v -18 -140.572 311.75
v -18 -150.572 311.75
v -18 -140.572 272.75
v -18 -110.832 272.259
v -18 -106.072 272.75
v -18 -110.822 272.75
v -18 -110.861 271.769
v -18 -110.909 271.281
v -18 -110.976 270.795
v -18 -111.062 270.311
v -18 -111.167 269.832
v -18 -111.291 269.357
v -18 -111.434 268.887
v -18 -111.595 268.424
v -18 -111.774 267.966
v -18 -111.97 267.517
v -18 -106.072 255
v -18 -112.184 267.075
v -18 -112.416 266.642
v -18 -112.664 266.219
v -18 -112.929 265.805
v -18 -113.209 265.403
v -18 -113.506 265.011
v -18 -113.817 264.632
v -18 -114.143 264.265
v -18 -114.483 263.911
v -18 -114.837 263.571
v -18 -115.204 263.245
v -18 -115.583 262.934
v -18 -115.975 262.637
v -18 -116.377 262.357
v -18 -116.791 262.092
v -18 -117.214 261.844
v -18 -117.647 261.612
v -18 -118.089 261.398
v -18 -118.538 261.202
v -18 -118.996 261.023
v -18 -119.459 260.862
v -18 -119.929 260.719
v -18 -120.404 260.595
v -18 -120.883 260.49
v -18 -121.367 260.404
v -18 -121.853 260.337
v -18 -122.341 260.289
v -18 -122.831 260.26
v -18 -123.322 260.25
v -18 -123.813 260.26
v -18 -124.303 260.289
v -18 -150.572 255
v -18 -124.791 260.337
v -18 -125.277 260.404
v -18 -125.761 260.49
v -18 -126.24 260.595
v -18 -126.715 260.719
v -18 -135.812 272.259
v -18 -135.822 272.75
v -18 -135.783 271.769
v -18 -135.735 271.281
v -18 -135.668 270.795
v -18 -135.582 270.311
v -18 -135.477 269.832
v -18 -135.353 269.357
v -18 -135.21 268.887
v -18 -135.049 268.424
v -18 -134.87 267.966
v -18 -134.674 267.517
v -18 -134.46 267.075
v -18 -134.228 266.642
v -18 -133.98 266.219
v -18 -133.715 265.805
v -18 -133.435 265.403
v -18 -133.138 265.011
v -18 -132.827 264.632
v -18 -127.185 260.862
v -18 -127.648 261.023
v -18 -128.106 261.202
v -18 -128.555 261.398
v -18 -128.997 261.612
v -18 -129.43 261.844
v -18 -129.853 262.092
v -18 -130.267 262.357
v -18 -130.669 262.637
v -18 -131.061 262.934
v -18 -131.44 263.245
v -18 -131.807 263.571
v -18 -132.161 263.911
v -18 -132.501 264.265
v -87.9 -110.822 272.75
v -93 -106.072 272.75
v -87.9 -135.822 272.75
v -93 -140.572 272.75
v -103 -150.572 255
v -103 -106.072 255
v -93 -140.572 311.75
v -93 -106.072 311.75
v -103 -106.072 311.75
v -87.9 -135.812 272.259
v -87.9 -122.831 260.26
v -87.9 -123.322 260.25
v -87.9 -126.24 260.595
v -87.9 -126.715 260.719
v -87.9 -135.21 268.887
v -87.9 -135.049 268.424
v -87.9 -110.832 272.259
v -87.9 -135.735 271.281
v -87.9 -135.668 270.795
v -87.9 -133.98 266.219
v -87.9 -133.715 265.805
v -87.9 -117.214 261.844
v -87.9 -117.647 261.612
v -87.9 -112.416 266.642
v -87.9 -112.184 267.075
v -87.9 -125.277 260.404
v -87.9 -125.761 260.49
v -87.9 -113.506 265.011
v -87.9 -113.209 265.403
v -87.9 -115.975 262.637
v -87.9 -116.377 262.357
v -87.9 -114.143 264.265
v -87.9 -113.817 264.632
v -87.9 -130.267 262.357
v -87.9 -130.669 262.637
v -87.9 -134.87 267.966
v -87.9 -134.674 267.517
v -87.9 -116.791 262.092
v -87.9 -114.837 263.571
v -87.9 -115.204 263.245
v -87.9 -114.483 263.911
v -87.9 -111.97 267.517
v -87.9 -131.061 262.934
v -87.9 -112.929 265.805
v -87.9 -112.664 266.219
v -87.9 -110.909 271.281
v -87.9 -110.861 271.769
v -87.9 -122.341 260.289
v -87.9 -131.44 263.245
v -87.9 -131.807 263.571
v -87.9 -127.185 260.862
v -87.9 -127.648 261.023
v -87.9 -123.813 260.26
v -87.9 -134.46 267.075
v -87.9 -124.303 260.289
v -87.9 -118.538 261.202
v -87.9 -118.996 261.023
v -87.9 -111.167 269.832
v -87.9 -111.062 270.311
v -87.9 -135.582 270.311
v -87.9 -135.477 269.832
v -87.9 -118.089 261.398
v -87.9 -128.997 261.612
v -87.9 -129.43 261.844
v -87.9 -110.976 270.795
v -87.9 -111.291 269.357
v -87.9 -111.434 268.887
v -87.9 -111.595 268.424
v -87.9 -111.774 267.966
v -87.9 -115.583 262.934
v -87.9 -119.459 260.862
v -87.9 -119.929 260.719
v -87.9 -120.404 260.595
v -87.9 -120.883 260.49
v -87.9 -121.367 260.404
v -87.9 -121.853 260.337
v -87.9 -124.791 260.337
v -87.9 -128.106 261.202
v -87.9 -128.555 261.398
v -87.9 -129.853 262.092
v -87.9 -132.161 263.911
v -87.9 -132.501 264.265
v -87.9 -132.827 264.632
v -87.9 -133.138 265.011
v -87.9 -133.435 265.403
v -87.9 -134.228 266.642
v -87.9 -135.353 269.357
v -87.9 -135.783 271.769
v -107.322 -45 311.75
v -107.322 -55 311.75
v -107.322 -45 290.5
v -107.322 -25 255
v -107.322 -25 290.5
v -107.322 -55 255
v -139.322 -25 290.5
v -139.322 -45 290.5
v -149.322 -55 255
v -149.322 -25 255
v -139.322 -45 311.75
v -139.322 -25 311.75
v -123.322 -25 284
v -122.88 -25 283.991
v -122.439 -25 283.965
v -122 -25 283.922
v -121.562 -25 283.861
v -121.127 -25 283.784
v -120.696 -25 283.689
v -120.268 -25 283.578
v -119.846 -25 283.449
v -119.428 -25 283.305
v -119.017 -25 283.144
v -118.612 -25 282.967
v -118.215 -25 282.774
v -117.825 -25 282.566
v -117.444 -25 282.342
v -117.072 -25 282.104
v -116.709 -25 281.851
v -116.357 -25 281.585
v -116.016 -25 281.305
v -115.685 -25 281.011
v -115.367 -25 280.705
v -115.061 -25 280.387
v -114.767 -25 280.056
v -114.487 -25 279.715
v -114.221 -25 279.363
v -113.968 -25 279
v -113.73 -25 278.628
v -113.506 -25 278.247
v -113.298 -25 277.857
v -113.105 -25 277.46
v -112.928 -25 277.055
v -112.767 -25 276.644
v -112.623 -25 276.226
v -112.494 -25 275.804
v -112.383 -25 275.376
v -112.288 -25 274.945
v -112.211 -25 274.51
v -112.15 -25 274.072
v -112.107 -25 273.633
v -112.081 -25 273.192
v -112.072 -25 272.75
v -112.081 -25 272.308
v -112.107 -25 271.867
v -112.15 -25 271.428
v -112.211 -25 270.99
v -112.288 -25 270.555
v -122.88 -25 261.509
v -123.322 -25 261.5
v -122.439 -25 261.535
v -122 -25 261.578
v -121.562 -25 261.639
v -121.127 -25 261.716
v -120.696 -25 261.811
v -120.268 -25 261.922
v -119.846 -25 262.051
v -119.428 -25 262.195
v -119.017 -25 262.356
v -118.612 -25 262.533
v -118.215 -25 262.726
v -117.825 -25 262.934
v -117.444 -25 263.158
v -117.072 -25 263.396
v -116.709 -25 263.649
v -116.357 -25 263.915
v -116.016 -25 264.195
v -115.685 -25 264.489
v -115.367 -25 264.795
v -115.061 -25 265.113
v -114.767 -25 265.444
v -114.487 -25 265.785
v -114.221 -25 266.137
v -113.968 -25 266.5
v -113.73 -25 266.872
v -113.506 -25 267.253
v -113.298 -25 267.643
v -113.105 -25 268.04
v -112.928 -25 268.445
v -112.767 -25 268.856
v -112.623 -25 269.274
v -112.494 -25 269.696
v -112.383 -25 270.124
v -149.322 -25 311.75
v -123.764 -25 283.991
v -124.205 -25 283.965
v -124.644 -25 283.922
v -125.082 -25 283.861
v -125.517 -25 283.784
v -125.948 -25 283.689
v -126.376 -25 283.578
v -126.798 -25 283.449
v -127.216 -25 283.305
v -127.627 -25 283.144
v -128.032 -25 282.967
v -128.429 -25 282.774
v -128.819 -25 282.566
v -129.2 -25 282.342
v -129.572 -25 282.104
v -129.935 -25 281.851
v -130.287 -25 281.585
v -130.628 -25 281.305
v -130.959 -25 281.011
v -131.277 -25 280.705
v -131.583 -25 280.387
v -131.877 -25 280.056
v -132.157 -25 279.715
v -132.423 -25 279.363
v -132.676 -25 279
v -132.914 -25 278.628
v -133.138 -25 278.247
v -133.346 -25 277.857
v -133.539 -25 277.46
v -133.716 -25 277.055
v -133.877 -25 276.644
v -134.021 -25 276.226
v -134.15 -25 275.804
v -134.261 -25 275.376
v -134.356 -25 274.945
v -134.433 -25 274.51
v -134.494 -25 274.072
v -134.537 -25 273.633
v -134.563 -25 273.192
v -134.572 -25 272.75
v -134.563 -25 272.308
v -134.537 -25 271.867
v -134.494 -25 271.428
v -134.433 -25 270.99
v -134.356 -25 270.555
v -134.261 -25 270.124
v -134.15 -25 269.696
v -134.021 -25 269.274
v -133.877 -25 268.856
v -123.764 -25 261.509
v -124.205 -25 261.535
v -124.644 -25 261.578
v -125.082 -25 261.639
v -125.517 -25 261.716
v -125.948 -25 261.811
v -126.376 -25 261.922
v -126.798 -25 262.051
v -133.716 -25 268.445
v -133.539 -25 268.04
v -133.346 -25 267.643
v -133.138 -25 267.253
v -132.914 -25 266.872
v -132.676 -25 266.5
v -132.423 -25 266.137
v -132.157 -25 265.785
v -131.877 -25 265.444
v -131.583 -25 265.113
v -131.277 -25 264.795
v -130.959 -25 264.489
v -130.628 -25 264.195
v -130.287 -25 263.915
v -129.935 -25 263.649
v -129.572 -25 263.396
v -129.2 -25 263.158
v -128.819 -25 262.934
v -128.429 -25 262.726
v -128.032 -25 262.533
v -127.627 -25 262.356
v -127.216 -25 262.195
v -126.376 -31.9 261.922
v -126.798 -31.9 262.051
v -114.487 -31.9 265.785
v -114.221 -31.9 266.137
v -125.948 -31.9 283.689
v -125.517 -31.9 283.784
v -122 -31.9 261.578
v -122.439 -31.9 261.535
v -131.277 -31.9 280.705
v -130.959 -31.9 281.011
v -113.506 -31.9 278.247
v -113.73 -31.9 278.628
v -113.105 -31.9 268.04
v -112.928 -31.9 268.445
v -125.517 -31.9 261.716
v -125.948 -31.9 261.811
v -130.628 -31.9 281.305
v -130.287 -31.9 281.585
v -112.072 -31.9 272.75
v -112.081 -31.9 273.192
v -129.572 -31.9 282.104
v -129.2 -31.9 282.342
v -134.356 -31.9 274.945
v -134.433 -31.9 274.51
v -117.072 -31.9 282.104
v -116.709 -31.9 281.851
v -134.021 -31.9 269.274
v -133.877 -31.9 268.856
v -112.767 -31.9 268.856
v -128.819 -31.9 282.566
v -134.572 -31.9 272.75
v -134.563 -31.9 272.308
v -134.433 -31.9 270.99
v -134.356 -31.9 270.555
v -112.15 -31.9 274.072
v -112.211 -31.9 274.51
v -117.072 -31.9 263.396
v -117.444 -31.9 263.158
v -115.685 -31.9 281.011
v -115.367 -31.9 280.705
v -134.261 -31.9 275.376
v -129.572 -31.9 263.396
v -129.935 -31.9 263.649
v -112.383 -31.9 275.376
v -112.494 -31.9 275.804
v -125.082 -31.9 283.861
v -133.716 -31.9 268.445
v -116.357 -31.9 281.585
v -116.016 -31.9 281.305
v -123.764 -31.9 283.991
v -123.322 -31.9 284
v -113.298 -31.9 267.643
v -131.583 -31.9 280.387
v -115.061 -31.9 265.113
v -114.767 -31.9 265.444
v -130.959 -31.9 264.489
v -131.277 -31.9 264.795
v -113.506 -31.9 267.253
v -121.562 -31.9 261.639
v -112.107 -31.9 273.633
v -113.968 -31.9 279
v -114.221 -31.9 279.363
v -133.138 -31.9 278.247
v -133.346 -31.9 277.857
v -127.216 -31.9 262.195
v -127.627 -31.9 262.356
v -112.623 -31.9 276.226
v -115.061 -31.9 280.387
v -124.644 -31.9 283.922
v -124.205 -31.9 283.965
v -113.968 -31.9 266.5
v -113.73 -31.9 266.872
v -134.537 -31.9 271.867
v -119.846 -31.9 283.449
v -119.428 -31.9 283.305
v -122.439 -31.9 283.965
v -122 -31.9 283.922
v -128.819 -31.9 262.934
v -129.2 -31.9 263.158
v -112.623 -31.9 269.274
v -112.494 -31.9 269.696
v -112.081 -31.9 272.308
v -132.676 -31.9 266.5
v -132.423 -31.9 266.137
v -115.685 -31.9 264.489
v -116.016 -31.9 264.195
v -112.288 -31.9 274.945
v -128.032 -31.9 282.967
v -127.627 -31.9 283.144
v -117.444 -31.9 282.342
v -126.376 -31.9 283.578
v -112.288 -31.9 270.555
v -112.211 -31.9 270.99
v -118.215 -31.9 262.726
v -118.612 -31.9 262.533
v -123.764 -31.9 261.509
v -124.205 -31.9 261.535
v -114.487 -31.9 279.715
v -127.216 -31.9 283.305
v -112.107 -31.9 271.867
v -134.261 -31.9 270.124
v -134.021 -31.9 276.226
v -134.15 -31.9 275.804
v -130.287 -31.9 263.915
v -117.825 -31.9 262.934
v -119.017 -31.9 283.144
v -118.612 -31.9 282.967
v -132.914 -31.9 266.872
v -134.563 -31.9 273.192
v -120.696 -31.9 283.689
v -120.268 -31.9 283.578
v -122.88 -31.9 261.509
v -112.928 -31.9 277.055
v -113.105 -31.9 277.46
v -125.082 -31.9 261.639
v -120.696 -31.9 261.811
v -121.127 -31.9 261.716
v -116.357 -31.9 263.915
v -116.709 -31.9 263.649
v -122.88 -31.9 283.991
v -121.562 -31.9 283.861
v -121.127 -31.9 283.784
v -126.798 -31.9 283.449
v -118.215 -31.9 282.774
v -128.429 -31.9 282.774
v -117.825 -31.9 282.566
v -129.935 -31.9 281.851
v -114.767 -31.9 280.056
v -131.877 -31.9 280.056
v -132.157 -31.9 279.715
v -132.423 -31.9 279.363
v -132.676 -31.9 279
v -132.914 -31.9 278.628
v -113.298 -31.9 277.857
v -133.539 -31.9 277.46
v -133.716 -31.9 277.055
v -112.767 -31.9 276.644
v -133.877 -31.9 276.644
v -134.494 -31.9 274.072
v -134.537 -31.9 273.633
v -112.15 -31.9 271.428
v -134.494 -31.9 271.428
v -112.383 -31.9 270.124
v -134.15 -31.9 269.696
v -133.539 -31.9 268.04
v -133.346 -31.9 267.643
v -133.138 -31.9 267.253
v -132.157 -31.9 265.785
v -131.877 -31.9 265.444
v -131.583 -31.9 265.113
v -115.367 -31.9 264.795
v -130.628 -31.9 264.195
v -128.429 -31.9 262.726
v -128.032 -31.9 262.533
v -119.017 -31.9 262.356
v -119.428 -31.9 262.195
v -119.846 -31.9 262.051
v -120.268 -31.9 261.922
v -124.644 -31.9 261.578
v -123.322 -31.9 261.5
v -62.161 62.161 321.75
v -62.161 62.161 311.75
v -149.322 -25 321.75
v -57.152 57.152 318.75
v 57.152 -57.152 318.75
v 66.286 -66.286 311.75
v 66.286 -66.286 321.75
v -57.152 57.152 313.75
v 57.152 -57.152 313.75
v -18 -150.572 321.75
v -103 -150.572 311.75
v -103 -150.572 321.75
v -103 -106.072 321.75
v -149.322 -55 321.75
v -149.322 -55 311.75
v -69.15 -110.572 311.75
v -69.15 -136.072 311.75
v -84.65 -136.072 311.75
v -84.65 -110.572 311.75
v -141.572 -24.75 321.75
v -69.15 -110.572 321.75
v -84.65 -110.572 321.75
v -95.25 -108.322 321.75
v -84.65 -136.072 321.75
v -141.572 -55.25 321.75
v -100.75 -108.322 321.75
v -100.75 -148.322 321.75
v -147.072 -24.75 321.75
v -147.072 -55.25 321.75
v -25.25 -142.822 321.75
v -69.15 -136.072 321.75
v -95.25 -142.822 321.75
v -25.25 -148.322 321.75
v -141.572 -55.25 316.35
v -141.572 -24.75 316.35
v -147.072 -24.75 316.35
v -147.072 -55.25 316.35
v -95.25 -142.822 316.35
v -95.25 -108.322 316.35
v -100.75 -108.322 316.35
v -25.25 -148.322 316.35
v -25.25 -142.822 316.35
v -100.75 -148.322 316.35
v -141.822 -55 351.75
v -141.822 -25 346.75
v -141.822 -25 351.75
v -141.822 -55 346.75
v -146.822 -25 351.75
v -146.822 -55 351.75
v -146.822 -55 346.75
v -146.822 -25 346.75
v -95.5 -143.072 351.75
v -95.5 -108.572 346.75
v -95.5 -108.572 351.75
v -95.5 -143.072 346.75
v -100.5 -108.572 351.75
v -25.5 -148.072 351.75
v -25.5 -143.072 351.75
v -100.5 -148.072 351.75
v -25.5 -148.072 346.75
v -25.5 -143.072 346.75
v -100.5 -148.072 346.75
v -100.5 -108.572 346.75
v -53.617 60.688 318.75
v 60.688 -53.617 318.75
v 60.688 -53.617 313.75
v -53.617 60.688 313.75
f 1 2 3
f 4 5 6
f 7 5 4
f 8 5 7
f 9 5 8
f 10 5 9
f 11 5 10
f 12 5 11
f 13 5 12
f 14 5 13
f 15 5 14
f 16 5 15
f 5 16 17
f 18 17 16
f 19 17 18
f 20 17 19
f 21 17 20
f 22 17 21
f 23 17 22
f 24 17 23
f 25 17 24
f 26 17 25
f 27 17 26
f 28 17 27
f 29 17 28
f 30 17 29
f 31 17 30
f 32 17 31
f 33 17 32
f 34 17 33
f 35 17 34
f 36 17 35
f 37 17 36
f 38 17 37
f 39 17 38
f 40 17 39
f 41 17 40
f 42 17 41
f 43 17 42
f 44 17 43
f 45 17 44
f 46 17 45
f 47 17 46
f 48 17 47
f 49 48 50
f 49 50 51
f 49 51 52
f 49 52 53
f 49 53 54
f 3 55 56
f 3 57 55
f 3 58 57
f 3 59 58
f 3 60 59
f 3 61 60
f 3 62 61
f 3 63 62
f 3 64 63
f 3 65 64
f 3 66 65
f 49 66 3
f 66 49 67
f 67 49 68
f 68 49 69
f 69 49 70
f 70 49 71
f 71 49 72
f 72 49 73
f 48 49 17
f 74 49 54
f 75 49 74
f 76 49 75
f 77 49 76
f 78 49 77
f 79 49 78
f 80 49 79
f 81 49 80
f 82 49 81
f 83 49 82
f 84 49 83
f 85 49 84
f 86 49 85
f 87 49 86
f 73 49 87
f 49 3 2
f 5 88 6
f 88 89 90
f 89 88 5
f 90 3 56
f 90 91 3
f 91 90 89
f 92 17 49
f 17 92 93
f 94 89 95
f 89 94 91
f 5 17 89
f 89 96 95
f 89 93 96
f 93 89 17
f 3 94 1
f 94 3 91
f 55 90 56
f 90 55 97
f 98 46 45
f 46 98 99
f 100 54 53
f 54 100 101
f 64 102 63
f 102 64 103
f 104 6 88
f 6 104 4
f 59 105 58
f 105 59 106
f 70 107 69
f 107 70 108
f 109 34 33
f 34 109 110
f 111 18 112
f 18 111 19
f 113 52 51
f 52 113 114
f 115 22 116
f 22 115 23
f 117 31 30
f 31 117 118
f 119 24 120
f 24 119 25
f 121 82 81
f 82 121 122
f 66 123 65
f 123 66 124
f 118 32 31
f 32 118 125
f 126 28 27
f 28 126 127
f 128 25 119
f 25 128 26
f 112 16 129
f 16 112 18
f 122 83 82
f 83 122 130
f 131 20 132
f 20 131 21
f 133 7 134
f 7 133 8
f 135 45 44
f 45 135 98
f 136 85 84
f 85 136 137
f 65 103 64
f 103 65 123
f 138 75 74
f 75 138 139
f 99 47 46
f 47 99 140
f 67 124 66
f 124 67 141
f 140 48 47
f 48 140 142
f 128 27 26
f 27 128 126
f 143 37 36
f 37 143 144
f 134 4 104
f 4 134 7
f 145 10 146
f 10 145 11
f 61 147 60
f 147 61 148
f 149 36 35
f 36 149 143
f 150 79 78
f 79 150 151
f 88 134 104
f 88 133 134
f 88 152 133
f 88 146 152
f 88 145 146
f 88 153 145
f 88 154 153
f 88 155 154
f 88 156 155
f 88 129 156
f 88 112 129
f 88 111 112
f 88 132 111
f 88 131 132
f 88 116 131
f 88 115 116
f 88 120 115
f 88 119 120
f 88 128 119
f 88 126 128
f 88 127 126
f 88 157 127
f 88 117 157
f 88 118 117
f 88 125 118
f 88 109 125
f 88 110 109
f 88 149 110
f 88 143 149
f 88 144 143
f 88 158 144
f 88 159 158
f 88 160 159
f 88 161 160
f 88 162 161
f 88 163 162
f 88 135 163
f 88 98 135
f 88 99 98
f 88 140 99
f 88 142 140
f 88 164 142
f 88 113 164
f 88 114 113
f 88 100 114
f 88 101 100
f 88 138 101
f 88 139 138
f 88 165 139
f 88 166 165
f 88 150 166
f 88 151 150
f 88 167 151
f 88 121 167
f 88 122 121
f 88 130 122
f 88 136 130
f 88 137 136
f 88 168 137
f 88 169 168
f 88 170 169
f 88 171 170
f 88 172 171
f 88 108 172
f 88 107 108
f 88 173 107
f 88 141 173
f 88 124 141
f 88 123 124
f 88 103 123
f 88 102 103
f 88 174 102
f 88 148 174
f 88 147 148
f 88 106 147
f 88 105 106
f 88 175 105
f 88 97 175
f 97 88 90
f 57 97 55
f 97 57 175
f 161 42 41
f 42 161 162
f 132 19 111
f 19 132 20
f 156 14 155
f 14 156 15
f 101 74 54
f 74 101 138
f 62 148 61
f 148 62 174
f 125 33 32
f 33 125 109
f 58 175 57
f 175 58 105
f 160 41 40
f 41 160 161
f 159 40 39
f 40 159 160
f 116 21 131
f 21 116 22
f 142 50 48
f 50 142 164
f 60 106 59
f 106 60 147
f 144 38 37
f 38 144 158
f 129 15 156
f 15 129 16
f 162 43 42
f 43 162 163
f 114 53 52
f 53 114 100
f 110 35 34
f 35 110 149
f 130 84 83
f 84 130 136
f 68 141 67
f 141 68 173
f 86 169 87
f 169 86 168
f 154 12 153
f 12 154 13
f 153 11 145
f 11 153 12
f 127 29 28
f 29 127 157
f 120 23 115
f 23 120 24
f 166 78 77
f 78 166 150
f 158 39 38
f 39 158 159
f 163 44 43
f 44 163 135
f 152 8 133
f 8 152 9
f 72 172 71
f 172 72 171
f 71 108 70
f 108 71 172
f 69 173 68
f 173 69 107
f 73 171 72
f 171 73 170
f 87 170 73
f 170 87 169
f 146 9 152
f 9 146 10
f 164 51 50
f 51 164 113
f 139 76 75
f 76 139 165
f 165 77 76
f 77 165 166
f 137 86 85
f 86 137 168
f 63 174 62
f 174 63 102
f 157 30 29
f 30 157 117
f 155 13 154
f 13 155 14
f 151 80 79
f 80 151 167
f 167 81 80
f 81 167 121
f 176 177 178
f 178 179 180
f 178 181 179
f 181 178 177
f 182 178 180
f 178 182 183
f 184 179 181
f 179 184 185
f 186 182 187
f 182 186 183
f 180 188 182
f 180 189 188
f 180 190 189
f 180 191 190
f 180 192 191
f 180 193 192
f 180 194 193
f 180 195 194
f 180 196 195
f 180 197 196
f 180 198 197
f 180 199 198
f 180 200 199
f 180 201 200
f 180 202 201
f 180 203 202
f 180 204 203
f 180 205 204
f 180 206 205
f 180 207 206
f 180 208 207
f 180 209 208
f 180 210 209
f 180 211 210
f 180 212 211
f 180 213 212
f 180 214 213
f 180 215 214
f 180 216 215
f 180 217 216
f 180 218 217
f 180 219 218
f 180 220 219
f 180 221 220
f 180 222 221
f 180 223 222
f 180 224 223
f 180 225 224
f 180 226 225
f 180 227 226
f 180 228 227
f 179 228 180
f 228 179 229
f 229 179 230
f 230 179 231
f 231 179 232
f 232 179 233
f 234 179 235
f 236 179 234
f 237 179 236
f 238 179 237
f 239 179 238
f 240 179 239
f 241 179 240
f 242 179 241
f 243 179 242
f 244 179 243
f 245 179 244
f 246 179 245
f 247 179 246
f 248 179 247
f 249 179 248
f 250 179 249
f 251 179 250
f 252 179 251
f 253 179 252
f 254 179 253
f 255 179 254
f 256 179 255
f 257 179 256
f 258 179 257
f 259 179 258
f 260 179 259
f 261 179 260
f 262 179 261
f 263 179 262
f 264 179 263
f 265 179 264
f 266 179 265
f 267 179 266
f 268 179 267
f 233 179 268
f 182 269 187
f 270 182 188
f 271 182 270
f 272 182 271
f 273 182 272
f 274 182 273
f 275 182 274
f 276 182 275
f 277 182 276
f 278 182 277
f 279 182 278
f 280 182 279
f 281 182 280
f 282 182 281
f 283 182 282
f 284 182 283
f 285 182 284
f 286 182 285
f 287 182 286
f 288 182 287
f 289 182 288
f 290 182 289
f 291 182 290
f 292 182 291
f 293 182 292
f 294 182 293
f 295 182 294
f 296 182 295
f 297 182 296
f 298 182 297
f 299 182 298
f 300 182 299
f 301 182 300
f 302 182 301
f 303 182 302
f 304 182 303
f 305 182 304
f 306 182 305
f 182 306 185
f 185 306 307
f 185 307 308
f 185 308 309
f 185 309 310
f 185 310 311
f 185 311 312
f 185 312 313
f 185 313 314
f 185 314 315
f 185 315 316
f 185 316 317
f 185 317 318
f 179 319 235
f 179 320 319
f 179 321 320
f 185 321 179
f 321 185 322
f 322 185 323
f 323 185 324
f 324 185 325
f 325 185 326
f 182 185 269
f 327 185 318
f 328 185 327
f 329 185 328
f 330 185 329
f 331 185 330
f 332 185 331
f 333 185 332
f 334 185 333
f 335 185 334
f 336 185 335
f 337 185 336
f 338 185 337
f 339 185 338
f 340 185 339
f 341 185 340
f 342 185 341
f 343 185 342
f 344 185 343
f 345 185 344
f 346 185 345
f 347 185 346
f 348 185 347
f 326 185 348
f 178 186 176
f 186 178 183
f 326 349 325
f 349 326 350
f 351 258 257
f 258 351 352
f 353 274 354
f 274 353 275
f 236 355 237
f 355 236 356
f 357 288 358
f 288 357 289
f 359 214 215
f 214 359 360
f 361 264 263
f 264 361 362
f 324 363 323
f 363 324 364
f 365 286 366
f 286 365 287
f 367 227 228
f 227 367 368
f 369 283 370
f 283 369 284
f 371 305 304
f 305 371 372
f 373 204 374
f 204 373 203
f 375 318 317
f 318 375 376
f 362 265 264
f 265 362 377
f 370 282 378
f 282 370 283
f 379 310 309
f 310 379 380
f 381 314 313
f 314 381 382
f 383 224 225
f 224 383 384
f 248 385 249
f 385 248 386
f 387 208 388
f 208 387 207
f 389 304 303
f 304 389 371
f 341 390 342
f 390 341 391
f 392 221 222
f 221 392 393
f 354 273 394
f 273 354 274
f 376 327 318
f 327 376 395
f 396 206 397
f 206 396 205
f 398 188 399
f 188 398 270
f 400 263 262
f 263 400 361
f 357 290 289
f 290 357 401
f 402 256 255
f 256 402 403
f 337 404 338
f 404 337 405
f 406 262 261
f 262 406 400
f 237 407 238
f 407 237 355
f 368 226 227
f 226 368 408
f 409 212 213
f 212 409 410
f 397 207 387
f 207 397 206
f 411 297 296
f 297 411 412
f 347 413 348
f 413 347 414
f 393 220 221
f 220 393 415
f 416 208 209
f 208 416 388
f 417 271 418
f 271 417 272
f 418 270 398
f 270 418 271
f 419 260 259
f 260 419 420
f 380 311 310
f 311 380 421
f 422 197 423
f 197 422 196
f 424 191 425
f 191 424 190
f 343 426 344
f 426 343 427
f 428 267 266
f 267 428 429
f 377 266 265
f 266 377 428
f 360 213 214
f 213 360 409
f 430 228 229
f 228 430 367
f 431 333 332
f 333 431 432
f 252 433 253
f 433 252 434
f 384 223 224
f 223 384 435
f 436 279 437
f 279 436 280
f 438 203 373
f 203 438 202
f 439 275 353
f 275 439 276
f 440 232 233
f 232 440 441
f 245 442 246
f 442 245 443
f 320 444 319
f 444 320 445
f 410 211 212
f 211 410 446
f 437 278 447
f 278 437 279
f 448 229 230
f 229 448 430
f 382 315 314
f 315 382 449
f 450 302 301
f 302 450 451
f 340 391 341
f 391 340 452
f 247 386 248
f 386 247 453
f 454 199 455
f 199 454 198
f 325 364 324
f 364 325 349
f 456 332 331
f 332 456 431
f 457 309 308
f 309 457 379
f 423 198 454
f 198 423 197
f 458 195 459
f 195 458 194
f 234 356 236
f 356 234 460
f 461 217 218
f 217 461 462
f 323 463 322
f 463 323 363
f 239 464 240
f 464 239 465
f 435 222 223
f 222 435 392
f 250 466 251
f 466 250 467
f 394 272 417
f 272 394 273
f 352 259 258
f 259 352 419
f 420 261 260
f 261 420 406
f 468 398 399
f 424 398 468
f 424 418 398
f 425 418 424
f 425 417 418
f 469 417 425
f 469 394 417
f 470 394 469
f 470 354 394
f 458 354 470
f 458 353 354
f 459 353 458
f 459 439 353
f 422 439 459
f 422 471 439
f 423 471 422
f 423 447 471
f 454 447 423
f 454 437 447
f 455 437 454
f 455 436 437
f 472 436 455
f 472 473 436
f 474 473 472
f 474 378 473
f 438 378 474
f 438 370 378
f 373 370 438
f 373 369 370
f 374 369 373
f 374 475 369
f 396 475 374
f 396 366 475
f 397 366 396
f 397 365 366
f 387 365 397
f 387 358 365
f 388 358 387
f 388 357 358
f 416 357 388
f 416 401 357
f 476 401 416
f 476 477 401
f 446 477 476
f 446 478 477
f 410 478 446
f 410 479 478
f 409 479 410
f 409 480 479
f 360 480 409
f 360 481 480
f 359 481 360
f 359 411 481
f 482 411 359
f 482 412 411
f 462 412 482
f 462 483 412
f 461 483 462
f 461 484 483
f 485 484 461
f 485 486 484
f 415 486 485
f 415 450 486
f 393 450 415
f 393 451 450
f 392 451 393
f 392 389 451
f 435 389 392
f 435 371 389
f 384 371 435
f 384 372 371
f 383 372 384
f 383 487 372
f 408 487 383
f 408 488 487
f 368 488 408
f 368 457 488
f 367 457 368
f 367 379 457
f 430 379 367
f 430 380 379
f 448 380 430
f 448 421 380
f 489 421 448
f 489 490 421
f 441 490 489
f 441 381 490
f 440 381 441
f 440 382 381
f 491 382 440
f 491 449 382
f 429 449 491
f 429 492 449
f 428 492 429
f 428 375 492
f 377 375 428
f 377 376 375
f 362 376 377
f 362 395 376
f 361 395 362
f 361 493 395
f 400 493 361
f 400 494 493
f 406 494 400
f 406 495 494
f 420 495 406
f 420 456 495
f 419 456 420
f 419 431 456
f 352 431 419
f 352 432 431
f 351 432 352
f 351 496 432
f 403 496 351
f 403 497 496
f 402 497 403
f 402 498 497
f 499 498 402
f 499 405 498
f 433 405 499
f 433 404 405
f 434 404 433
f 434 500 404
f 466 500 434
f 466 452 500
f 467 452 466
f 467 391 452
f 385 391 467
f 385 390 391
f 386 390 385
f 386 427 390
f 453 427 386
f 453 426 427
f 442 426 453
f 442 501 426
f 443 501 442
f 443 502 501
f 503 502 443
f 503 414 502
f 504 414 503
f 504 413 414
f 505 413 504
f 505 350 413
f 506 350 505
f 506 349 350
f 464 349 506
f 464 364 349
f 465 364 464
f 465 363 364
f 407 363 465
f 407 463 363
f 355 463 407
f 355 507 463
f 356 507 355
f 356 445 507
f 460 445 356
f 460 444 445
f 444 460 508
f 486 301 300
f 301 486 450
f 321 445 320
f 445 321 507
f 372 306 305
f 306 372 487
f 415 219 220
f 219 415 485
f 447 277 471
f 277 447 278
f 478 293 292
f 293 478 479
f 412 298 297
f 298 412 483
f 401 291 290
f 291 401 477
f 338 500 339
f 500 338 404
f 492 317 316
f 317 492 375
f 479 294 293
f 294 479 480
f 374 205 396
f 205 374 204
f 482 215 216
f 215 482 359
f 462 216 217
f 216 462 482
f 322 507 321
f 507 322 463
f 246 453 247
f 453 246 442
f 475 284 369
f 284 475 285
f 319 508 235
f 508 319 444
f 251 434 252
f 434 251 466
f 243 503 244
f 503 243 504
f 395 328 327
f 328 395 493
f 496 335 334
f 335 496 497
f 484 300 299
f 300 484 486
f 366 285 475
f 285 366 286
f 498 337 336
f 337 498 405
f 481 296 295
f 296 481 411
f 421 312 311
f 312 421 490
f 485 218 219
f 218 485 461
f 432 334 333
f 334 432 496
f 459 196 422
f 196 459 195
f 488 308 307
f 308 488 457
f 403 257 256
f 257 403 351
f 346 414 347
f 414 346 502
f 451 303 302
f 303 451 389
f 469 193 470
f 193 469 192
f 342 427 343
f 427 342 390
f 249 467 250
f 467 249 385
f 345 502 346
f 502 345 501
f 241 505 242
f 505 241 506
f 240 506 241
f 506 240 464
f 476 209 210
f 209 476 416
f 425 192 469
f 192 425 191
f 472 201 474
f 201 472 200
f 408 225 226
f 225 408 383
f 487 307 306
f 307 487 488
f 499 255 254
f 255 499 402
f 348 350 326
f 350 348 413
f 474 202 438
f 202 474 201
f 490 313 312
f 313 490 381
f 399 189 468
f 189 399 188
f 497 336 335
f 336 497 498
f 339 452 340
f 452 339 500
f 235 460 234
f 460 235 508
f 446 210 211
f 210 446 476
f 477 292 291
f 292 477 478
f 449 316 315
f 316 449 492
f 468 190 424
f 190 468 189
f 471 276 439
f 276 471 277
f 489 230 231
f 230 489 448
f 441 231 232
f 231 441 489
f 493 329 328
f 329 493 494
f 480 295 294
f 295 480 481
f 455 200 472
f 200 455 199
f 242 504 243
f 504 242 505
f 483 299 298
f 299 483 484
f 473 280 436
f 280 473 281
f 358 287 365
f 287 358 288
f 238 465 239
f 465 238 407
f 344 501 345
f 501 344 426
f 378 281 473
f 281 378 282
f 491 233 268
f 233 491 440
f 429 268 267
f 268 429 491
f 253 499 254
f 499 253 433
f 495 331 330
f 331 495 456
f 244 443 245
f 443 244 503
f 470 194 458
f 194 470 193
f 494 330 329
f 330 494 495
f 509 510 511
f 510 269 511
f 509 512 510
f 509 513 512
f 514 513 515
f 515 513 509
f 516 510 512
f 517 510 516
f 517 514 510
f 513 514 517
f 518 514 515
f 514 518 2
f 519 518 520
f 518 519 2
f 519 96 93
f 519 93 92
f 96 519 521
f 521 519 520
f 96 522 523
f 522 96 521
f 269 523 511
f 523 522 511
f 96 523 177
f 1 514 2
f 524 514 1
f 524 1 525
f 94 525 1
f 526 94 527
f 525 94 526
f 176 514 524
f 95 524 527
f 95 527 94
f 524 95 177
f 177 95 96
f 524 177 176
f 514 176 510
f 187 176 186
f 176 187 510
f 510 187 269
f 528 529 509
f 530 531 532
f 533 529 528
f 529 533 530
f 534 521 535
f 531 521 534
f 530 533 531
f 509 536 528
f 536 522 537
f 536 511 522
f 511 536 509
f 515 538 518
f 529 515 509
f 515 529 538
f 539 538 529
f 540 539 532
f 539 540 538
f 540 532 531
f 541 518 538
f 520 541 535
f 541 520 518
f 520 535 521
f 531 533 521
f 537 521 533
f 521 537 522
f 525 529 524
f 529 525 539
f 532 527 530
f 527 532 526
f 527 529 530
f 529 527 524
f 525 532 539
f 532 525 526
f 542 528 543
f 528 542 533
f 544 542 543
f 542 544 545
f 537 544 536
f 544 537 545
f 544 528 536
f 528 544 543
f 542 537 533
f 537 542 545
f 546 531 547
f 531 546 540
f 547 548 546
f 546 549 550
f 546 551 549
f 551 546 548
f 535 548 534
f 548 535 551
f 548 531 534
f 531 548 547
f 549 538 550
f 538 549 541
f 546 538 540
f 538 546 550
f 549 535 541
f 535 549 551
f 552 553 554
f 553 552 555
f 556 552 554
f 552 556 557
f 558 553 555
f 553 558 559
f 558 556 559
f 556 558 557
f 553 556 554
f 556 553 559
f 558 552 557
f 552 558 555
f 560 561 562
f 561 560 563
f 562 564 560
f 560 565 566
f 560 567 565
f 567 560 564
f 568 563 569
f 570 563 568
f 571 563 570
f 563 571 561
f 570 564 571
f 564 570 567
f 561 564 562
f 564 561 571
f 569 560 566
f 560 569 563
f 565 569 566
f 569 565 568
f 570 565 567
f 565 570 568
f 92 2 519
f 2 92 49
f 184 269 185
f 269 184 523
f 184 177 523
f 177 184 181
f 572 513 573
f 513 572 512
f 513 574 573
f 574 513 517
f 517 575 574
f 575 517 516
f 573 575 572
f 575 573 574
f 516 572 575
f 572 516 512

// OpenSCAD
//Ball
/*translate ([0,0,150])
%sphere (r=150); */

/*
translate ([0,0,-255])
rotate ([0,0,135.00010769])
*/



//Motorplattform 2
difference()
{
translate([-55.5,-123.322,263.875])
cube([75,34.5,17.75],center=true);

translate ([-87.9,-123.322,272.75])
rotate ([0,90,0])
cylinder(r=12.5,h=70,$fn=160);
}
translate ([-60.5,-145.572,283.375])
cube ([85,10,56.75],center=true);
translate([-98,-123.322,283.375])
cube([10,34.5,56.75],center=true);



//Kugellagerplattform 2
difference()
{
translate ([-123.322,-35,272.75])
cube ([32,20,35.5],center=true);
    
translate([-123.322,-24.9,272.75])
rotate ([90,0,0])
cylinder(r=11.25,h=7,$fn=160);
}

translate ([-144.322,-40,283.375])
cube ([10,30,56.75],center=true);
translate ([-123.322,-50,283.375])
cube([32,10,56.75],center=true);



//Hauptplattform
difference()
{
polyhedron
(
points  =[  
[-149.322,-25,311.75],[-62.161,62.161,311.75],
[66.286,-66.286,311.75],
[-18,-150.572,311.75],[-103,-150.572,311.75],
[-103,-106.072,311.75],[-149.322,-55,311.75],

[-149.32225,-25,321.75],[-62.161,62.161,321.75],
[66.286,-66.286,321.75],
[-18,-150.572,321.75],[-103,-150.572,321.75],
[-103,-106.072,321.75],[-149.322,-55,321.75]
            ],

faces   =[  [0,1,8,7],[1,2,9,8],
            [2,3,10,9],[3,4,11,10],
            [4,5,12,11],[5,6,13,12],
            [6,0,7,13],
            [0,6,5,4,3,2,1],[13,7,8,9,10,11,12]]
);
           
translate ([-76.9,-123.322,316.75])
cube ([15.5,25.5,10.2],center=true);

translate ([-144.322,-40,319.1])
cube ([5.5,30.5,5.5],center=true);

translate ([-98,-125.822,319.1])
cube ([5.5,35,5.5],center=true);

translate ([-63,-145.572,319.1])
cube ([75.5,5.5,5.5],center=true);
}
translate ([0,0,316.25])
rotate ([0,0,135])
cube ([161.651,10,5],center=true);




//Wand
translate ([0,0,30])
{
difference()
{
polyhedron
(
points  =[ 
    
[-149.322,-25,321.75],[-62.161,62.161,321.75],
[66.286,-66.286,321.75],[-18,-150.572,321.75],
[-103,-150.572,321.75],[-103,-106.072,321.75],
[-149.322,-55,321.75],
[0,0,0],[0,0,0],[0,0,0],
    
[-149.322,-25,371.75],[-62.161,62.161,371.75],
[66.286,-66.286,371.75],[-18,-150.572,371.75],
[-103,-150.572,371.75],[-103,-106.072,371.75],
[-149.322,-55,371.75],
[0,0,0],[0,0,0],[0,0,0],
    
[-139.322,-28.666,321.75],[-55.09,55.09,321.75],
[58.456,-58.456,321.75],[-21.666,-140.572,321.75],
[-93,-140.572,321.75],[-93,-102.406,321.75],
[-139.322,-51.334,321.75],
[0,0,0],[0,0,0],[0,0,0],
    
[-139.322,-28.666,371.75],[-55.09,55.09,371.75],
[58.456,-58.456,371.75],[-21.666,-140.572,371.75],
[-93,-140.572,371.75],[-93,-102.406,371.75],
[-139.32,-51.334,371.75],
[0,0,0],[0,0,0],[0,0,0],
],

faces   =[  [0,1,11,10],[2,3,13,12],
            [3,4,14,13 ],[4,5,15,14],
            [5,6,16,15],[6,0,10,16],
            
            [20,30,31,21],[22,32,33,23],
            [23,33,34,24],[24,34,35,25],
            [25,35,36,26],[26,36,30,20],
            
            [0,20,21,1],[2,22,23,3],
            [3,23,24,4],[4,24,25,5],
            [5,25,26,6],[6,26,20,0],
            
            [10,11,31,30],[12,13,33,32],
            [13,14,34,33],[14,15,35,34],
            [15,16,36,35],[16,10,30,36],
            
            [1,21,31,11],[2,12,32,22]
            ]
);

polyhedron
(
points=[    [-144.322,-26.833,366.75],[-58.525,58.925,366.75],
            [62.356,-61.956,366.75],[-19.833,-145.572,366.75],
            [-98,-145.572,366.75],[-98,-104.239,366.75],
            [-144.322,-53.167,366.75],
            [0,0,0],[0,0,0],[0,0,0],
            
            [-144.322,-26.833,371.76],[-58.525,58.925,371.76],
            [62.356,-61.956,371.76],[-19.833,-145.572,371.76],
            [-98,-145.572,371.76],[-98,-104.239,371.76],
            [-144.322,-53.167,371.76],
            [0,0,0],[0,0,0],[0,0,0],
            
[-137.122,-28.666,371.76],[-54.88,55.28,371.76],
[58.456,-58.256,371.76],[-21.666,-138.572,371.76],
[-92,-138.572,371.76],[-91,-102.406,371.76],
[-137.322,-51.334,371.76],
[0,0,0],[0,0,0],[0,0,0],

[-137.122,-28.666,366.75],[-54.88,55.28,366.75],
[58.456,-58.256,366.75],[-21.666,-138.572,366.75],
[-92,-138.572,366.75],[-91,-102.406,366.75],
[-137.322,-51.334,366.75],
[0,0,0],[0,0,0],[0,0,0]
       ],
       
faces =[  [0,10,11,1],[6,16,10,0],
          [5,15,16,6],[4,14,15,5],
          [3,13,14,4],[2,12,13,3],
          
          [31,21,20,30],[30,20,26,36],
          [36,26,25,35],[35,25,24,34],
          [34,24,23,33],[33,23,22,32],
          
          [10,20,21,11],[16,26,20,10],
          [15,25,26,16],[14,24,25,15],
          [13,23,24,14],[12,22,23,13],
          
          [1,11,21,31],[32,22,12,2],
          
          [1,31,30,0],[6,36,35,5],
          [0,30,36,6],[5,35,34,4],
          [4,34,33,3],[3,33,32,2],
       ]
);
}

translate ([-144.322,-40,319.25])
cube ([5,30,5],center=true);

translate ([-98,-125.822,319.25])
cube ([5,34.5,5],center=true);

translate ([-63,-145.572,319.25])
cube ([75,5,5],center=true);
}    
